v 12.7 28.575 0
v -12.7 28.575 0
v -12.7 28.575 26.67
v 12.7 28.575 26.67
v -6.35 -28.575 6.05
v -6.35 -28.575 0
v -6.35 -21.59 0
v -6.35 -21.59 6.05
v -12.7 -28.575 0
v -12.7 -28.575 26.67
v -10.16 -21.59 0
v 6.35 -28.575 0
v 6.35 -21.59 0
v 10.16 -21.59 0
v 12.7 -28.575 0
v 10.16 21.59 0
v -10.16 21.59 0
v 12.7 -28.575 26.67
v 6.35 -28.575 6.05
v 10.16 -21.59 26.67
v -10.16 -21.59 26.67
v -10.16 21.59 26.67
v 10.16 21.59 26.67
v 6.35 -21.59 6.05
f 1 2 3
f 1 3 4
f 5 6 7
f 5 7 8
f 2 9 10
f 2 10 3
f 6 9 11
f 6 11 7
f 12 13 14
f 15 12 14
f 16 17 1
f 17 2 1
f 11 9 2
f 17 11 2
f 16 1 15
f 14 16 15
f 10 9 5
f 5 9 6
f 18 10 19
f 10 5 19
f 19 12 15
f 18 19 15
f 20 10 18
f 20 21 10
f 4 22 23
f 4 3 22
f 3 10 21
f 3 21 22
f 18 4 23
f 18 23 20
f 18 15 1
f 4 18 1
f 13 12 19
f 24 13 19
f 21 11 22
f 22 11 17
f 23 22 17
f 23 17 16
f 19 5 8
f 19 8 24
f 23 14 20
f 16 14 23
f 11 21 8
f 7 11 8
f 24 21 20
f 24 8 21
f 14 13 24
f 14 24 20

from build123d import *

# Parameters (mm, degrees)
SKETCH2_W           = 25.4
SKETCH2_H           = 57.15
SKETCH2_W_2         = 20.32
SKETCH2_H_2         = 43.18
BOSS_EXTRUDE2_DEPTH = 26.67
CUT_EXTRUDE1_REACH  = 59.15
SKETCH3_W           = 12.7
SKETCH3_H           = 12.7


with BuildPart() as part:
    # Sketch2 → Boss-Extrude2 (new body)
    with BuildSketch(Plane.XY):
        Rectangle(SKETCH2_W, SKETCH2_H)
        Rectangle(SKETCH2_W_2, SKETCH2_H_2, mode=Mode.SUBTRACT)
    extrude(amount=BOSS_EXTRUDE2_DEPTH)

    # Sketch3 → Cut-Extrude1 (cut, up to next)
    with BuildSketch(Plane.XZ.offset(28.575), mode=Mode.PRIVATE) as cut_extrude1_sk1:
        with Locations((0, -0.299628978)):
            Rectangle(SKETCH3_W, SKETCH3_H)
    cut_extrude1_tool1 = extrude(cut_extrude1_sk1.sketch, amount=-CUT_EXTRUDE1_REACH, mode=Mode.PRIVATE) & part.part
    add(cut_extrude1_tool1.solids().sort_by_distance((0, -28.575, -0.299629))[0], mode=Mode.SUBTRACT)


solid = part.part
